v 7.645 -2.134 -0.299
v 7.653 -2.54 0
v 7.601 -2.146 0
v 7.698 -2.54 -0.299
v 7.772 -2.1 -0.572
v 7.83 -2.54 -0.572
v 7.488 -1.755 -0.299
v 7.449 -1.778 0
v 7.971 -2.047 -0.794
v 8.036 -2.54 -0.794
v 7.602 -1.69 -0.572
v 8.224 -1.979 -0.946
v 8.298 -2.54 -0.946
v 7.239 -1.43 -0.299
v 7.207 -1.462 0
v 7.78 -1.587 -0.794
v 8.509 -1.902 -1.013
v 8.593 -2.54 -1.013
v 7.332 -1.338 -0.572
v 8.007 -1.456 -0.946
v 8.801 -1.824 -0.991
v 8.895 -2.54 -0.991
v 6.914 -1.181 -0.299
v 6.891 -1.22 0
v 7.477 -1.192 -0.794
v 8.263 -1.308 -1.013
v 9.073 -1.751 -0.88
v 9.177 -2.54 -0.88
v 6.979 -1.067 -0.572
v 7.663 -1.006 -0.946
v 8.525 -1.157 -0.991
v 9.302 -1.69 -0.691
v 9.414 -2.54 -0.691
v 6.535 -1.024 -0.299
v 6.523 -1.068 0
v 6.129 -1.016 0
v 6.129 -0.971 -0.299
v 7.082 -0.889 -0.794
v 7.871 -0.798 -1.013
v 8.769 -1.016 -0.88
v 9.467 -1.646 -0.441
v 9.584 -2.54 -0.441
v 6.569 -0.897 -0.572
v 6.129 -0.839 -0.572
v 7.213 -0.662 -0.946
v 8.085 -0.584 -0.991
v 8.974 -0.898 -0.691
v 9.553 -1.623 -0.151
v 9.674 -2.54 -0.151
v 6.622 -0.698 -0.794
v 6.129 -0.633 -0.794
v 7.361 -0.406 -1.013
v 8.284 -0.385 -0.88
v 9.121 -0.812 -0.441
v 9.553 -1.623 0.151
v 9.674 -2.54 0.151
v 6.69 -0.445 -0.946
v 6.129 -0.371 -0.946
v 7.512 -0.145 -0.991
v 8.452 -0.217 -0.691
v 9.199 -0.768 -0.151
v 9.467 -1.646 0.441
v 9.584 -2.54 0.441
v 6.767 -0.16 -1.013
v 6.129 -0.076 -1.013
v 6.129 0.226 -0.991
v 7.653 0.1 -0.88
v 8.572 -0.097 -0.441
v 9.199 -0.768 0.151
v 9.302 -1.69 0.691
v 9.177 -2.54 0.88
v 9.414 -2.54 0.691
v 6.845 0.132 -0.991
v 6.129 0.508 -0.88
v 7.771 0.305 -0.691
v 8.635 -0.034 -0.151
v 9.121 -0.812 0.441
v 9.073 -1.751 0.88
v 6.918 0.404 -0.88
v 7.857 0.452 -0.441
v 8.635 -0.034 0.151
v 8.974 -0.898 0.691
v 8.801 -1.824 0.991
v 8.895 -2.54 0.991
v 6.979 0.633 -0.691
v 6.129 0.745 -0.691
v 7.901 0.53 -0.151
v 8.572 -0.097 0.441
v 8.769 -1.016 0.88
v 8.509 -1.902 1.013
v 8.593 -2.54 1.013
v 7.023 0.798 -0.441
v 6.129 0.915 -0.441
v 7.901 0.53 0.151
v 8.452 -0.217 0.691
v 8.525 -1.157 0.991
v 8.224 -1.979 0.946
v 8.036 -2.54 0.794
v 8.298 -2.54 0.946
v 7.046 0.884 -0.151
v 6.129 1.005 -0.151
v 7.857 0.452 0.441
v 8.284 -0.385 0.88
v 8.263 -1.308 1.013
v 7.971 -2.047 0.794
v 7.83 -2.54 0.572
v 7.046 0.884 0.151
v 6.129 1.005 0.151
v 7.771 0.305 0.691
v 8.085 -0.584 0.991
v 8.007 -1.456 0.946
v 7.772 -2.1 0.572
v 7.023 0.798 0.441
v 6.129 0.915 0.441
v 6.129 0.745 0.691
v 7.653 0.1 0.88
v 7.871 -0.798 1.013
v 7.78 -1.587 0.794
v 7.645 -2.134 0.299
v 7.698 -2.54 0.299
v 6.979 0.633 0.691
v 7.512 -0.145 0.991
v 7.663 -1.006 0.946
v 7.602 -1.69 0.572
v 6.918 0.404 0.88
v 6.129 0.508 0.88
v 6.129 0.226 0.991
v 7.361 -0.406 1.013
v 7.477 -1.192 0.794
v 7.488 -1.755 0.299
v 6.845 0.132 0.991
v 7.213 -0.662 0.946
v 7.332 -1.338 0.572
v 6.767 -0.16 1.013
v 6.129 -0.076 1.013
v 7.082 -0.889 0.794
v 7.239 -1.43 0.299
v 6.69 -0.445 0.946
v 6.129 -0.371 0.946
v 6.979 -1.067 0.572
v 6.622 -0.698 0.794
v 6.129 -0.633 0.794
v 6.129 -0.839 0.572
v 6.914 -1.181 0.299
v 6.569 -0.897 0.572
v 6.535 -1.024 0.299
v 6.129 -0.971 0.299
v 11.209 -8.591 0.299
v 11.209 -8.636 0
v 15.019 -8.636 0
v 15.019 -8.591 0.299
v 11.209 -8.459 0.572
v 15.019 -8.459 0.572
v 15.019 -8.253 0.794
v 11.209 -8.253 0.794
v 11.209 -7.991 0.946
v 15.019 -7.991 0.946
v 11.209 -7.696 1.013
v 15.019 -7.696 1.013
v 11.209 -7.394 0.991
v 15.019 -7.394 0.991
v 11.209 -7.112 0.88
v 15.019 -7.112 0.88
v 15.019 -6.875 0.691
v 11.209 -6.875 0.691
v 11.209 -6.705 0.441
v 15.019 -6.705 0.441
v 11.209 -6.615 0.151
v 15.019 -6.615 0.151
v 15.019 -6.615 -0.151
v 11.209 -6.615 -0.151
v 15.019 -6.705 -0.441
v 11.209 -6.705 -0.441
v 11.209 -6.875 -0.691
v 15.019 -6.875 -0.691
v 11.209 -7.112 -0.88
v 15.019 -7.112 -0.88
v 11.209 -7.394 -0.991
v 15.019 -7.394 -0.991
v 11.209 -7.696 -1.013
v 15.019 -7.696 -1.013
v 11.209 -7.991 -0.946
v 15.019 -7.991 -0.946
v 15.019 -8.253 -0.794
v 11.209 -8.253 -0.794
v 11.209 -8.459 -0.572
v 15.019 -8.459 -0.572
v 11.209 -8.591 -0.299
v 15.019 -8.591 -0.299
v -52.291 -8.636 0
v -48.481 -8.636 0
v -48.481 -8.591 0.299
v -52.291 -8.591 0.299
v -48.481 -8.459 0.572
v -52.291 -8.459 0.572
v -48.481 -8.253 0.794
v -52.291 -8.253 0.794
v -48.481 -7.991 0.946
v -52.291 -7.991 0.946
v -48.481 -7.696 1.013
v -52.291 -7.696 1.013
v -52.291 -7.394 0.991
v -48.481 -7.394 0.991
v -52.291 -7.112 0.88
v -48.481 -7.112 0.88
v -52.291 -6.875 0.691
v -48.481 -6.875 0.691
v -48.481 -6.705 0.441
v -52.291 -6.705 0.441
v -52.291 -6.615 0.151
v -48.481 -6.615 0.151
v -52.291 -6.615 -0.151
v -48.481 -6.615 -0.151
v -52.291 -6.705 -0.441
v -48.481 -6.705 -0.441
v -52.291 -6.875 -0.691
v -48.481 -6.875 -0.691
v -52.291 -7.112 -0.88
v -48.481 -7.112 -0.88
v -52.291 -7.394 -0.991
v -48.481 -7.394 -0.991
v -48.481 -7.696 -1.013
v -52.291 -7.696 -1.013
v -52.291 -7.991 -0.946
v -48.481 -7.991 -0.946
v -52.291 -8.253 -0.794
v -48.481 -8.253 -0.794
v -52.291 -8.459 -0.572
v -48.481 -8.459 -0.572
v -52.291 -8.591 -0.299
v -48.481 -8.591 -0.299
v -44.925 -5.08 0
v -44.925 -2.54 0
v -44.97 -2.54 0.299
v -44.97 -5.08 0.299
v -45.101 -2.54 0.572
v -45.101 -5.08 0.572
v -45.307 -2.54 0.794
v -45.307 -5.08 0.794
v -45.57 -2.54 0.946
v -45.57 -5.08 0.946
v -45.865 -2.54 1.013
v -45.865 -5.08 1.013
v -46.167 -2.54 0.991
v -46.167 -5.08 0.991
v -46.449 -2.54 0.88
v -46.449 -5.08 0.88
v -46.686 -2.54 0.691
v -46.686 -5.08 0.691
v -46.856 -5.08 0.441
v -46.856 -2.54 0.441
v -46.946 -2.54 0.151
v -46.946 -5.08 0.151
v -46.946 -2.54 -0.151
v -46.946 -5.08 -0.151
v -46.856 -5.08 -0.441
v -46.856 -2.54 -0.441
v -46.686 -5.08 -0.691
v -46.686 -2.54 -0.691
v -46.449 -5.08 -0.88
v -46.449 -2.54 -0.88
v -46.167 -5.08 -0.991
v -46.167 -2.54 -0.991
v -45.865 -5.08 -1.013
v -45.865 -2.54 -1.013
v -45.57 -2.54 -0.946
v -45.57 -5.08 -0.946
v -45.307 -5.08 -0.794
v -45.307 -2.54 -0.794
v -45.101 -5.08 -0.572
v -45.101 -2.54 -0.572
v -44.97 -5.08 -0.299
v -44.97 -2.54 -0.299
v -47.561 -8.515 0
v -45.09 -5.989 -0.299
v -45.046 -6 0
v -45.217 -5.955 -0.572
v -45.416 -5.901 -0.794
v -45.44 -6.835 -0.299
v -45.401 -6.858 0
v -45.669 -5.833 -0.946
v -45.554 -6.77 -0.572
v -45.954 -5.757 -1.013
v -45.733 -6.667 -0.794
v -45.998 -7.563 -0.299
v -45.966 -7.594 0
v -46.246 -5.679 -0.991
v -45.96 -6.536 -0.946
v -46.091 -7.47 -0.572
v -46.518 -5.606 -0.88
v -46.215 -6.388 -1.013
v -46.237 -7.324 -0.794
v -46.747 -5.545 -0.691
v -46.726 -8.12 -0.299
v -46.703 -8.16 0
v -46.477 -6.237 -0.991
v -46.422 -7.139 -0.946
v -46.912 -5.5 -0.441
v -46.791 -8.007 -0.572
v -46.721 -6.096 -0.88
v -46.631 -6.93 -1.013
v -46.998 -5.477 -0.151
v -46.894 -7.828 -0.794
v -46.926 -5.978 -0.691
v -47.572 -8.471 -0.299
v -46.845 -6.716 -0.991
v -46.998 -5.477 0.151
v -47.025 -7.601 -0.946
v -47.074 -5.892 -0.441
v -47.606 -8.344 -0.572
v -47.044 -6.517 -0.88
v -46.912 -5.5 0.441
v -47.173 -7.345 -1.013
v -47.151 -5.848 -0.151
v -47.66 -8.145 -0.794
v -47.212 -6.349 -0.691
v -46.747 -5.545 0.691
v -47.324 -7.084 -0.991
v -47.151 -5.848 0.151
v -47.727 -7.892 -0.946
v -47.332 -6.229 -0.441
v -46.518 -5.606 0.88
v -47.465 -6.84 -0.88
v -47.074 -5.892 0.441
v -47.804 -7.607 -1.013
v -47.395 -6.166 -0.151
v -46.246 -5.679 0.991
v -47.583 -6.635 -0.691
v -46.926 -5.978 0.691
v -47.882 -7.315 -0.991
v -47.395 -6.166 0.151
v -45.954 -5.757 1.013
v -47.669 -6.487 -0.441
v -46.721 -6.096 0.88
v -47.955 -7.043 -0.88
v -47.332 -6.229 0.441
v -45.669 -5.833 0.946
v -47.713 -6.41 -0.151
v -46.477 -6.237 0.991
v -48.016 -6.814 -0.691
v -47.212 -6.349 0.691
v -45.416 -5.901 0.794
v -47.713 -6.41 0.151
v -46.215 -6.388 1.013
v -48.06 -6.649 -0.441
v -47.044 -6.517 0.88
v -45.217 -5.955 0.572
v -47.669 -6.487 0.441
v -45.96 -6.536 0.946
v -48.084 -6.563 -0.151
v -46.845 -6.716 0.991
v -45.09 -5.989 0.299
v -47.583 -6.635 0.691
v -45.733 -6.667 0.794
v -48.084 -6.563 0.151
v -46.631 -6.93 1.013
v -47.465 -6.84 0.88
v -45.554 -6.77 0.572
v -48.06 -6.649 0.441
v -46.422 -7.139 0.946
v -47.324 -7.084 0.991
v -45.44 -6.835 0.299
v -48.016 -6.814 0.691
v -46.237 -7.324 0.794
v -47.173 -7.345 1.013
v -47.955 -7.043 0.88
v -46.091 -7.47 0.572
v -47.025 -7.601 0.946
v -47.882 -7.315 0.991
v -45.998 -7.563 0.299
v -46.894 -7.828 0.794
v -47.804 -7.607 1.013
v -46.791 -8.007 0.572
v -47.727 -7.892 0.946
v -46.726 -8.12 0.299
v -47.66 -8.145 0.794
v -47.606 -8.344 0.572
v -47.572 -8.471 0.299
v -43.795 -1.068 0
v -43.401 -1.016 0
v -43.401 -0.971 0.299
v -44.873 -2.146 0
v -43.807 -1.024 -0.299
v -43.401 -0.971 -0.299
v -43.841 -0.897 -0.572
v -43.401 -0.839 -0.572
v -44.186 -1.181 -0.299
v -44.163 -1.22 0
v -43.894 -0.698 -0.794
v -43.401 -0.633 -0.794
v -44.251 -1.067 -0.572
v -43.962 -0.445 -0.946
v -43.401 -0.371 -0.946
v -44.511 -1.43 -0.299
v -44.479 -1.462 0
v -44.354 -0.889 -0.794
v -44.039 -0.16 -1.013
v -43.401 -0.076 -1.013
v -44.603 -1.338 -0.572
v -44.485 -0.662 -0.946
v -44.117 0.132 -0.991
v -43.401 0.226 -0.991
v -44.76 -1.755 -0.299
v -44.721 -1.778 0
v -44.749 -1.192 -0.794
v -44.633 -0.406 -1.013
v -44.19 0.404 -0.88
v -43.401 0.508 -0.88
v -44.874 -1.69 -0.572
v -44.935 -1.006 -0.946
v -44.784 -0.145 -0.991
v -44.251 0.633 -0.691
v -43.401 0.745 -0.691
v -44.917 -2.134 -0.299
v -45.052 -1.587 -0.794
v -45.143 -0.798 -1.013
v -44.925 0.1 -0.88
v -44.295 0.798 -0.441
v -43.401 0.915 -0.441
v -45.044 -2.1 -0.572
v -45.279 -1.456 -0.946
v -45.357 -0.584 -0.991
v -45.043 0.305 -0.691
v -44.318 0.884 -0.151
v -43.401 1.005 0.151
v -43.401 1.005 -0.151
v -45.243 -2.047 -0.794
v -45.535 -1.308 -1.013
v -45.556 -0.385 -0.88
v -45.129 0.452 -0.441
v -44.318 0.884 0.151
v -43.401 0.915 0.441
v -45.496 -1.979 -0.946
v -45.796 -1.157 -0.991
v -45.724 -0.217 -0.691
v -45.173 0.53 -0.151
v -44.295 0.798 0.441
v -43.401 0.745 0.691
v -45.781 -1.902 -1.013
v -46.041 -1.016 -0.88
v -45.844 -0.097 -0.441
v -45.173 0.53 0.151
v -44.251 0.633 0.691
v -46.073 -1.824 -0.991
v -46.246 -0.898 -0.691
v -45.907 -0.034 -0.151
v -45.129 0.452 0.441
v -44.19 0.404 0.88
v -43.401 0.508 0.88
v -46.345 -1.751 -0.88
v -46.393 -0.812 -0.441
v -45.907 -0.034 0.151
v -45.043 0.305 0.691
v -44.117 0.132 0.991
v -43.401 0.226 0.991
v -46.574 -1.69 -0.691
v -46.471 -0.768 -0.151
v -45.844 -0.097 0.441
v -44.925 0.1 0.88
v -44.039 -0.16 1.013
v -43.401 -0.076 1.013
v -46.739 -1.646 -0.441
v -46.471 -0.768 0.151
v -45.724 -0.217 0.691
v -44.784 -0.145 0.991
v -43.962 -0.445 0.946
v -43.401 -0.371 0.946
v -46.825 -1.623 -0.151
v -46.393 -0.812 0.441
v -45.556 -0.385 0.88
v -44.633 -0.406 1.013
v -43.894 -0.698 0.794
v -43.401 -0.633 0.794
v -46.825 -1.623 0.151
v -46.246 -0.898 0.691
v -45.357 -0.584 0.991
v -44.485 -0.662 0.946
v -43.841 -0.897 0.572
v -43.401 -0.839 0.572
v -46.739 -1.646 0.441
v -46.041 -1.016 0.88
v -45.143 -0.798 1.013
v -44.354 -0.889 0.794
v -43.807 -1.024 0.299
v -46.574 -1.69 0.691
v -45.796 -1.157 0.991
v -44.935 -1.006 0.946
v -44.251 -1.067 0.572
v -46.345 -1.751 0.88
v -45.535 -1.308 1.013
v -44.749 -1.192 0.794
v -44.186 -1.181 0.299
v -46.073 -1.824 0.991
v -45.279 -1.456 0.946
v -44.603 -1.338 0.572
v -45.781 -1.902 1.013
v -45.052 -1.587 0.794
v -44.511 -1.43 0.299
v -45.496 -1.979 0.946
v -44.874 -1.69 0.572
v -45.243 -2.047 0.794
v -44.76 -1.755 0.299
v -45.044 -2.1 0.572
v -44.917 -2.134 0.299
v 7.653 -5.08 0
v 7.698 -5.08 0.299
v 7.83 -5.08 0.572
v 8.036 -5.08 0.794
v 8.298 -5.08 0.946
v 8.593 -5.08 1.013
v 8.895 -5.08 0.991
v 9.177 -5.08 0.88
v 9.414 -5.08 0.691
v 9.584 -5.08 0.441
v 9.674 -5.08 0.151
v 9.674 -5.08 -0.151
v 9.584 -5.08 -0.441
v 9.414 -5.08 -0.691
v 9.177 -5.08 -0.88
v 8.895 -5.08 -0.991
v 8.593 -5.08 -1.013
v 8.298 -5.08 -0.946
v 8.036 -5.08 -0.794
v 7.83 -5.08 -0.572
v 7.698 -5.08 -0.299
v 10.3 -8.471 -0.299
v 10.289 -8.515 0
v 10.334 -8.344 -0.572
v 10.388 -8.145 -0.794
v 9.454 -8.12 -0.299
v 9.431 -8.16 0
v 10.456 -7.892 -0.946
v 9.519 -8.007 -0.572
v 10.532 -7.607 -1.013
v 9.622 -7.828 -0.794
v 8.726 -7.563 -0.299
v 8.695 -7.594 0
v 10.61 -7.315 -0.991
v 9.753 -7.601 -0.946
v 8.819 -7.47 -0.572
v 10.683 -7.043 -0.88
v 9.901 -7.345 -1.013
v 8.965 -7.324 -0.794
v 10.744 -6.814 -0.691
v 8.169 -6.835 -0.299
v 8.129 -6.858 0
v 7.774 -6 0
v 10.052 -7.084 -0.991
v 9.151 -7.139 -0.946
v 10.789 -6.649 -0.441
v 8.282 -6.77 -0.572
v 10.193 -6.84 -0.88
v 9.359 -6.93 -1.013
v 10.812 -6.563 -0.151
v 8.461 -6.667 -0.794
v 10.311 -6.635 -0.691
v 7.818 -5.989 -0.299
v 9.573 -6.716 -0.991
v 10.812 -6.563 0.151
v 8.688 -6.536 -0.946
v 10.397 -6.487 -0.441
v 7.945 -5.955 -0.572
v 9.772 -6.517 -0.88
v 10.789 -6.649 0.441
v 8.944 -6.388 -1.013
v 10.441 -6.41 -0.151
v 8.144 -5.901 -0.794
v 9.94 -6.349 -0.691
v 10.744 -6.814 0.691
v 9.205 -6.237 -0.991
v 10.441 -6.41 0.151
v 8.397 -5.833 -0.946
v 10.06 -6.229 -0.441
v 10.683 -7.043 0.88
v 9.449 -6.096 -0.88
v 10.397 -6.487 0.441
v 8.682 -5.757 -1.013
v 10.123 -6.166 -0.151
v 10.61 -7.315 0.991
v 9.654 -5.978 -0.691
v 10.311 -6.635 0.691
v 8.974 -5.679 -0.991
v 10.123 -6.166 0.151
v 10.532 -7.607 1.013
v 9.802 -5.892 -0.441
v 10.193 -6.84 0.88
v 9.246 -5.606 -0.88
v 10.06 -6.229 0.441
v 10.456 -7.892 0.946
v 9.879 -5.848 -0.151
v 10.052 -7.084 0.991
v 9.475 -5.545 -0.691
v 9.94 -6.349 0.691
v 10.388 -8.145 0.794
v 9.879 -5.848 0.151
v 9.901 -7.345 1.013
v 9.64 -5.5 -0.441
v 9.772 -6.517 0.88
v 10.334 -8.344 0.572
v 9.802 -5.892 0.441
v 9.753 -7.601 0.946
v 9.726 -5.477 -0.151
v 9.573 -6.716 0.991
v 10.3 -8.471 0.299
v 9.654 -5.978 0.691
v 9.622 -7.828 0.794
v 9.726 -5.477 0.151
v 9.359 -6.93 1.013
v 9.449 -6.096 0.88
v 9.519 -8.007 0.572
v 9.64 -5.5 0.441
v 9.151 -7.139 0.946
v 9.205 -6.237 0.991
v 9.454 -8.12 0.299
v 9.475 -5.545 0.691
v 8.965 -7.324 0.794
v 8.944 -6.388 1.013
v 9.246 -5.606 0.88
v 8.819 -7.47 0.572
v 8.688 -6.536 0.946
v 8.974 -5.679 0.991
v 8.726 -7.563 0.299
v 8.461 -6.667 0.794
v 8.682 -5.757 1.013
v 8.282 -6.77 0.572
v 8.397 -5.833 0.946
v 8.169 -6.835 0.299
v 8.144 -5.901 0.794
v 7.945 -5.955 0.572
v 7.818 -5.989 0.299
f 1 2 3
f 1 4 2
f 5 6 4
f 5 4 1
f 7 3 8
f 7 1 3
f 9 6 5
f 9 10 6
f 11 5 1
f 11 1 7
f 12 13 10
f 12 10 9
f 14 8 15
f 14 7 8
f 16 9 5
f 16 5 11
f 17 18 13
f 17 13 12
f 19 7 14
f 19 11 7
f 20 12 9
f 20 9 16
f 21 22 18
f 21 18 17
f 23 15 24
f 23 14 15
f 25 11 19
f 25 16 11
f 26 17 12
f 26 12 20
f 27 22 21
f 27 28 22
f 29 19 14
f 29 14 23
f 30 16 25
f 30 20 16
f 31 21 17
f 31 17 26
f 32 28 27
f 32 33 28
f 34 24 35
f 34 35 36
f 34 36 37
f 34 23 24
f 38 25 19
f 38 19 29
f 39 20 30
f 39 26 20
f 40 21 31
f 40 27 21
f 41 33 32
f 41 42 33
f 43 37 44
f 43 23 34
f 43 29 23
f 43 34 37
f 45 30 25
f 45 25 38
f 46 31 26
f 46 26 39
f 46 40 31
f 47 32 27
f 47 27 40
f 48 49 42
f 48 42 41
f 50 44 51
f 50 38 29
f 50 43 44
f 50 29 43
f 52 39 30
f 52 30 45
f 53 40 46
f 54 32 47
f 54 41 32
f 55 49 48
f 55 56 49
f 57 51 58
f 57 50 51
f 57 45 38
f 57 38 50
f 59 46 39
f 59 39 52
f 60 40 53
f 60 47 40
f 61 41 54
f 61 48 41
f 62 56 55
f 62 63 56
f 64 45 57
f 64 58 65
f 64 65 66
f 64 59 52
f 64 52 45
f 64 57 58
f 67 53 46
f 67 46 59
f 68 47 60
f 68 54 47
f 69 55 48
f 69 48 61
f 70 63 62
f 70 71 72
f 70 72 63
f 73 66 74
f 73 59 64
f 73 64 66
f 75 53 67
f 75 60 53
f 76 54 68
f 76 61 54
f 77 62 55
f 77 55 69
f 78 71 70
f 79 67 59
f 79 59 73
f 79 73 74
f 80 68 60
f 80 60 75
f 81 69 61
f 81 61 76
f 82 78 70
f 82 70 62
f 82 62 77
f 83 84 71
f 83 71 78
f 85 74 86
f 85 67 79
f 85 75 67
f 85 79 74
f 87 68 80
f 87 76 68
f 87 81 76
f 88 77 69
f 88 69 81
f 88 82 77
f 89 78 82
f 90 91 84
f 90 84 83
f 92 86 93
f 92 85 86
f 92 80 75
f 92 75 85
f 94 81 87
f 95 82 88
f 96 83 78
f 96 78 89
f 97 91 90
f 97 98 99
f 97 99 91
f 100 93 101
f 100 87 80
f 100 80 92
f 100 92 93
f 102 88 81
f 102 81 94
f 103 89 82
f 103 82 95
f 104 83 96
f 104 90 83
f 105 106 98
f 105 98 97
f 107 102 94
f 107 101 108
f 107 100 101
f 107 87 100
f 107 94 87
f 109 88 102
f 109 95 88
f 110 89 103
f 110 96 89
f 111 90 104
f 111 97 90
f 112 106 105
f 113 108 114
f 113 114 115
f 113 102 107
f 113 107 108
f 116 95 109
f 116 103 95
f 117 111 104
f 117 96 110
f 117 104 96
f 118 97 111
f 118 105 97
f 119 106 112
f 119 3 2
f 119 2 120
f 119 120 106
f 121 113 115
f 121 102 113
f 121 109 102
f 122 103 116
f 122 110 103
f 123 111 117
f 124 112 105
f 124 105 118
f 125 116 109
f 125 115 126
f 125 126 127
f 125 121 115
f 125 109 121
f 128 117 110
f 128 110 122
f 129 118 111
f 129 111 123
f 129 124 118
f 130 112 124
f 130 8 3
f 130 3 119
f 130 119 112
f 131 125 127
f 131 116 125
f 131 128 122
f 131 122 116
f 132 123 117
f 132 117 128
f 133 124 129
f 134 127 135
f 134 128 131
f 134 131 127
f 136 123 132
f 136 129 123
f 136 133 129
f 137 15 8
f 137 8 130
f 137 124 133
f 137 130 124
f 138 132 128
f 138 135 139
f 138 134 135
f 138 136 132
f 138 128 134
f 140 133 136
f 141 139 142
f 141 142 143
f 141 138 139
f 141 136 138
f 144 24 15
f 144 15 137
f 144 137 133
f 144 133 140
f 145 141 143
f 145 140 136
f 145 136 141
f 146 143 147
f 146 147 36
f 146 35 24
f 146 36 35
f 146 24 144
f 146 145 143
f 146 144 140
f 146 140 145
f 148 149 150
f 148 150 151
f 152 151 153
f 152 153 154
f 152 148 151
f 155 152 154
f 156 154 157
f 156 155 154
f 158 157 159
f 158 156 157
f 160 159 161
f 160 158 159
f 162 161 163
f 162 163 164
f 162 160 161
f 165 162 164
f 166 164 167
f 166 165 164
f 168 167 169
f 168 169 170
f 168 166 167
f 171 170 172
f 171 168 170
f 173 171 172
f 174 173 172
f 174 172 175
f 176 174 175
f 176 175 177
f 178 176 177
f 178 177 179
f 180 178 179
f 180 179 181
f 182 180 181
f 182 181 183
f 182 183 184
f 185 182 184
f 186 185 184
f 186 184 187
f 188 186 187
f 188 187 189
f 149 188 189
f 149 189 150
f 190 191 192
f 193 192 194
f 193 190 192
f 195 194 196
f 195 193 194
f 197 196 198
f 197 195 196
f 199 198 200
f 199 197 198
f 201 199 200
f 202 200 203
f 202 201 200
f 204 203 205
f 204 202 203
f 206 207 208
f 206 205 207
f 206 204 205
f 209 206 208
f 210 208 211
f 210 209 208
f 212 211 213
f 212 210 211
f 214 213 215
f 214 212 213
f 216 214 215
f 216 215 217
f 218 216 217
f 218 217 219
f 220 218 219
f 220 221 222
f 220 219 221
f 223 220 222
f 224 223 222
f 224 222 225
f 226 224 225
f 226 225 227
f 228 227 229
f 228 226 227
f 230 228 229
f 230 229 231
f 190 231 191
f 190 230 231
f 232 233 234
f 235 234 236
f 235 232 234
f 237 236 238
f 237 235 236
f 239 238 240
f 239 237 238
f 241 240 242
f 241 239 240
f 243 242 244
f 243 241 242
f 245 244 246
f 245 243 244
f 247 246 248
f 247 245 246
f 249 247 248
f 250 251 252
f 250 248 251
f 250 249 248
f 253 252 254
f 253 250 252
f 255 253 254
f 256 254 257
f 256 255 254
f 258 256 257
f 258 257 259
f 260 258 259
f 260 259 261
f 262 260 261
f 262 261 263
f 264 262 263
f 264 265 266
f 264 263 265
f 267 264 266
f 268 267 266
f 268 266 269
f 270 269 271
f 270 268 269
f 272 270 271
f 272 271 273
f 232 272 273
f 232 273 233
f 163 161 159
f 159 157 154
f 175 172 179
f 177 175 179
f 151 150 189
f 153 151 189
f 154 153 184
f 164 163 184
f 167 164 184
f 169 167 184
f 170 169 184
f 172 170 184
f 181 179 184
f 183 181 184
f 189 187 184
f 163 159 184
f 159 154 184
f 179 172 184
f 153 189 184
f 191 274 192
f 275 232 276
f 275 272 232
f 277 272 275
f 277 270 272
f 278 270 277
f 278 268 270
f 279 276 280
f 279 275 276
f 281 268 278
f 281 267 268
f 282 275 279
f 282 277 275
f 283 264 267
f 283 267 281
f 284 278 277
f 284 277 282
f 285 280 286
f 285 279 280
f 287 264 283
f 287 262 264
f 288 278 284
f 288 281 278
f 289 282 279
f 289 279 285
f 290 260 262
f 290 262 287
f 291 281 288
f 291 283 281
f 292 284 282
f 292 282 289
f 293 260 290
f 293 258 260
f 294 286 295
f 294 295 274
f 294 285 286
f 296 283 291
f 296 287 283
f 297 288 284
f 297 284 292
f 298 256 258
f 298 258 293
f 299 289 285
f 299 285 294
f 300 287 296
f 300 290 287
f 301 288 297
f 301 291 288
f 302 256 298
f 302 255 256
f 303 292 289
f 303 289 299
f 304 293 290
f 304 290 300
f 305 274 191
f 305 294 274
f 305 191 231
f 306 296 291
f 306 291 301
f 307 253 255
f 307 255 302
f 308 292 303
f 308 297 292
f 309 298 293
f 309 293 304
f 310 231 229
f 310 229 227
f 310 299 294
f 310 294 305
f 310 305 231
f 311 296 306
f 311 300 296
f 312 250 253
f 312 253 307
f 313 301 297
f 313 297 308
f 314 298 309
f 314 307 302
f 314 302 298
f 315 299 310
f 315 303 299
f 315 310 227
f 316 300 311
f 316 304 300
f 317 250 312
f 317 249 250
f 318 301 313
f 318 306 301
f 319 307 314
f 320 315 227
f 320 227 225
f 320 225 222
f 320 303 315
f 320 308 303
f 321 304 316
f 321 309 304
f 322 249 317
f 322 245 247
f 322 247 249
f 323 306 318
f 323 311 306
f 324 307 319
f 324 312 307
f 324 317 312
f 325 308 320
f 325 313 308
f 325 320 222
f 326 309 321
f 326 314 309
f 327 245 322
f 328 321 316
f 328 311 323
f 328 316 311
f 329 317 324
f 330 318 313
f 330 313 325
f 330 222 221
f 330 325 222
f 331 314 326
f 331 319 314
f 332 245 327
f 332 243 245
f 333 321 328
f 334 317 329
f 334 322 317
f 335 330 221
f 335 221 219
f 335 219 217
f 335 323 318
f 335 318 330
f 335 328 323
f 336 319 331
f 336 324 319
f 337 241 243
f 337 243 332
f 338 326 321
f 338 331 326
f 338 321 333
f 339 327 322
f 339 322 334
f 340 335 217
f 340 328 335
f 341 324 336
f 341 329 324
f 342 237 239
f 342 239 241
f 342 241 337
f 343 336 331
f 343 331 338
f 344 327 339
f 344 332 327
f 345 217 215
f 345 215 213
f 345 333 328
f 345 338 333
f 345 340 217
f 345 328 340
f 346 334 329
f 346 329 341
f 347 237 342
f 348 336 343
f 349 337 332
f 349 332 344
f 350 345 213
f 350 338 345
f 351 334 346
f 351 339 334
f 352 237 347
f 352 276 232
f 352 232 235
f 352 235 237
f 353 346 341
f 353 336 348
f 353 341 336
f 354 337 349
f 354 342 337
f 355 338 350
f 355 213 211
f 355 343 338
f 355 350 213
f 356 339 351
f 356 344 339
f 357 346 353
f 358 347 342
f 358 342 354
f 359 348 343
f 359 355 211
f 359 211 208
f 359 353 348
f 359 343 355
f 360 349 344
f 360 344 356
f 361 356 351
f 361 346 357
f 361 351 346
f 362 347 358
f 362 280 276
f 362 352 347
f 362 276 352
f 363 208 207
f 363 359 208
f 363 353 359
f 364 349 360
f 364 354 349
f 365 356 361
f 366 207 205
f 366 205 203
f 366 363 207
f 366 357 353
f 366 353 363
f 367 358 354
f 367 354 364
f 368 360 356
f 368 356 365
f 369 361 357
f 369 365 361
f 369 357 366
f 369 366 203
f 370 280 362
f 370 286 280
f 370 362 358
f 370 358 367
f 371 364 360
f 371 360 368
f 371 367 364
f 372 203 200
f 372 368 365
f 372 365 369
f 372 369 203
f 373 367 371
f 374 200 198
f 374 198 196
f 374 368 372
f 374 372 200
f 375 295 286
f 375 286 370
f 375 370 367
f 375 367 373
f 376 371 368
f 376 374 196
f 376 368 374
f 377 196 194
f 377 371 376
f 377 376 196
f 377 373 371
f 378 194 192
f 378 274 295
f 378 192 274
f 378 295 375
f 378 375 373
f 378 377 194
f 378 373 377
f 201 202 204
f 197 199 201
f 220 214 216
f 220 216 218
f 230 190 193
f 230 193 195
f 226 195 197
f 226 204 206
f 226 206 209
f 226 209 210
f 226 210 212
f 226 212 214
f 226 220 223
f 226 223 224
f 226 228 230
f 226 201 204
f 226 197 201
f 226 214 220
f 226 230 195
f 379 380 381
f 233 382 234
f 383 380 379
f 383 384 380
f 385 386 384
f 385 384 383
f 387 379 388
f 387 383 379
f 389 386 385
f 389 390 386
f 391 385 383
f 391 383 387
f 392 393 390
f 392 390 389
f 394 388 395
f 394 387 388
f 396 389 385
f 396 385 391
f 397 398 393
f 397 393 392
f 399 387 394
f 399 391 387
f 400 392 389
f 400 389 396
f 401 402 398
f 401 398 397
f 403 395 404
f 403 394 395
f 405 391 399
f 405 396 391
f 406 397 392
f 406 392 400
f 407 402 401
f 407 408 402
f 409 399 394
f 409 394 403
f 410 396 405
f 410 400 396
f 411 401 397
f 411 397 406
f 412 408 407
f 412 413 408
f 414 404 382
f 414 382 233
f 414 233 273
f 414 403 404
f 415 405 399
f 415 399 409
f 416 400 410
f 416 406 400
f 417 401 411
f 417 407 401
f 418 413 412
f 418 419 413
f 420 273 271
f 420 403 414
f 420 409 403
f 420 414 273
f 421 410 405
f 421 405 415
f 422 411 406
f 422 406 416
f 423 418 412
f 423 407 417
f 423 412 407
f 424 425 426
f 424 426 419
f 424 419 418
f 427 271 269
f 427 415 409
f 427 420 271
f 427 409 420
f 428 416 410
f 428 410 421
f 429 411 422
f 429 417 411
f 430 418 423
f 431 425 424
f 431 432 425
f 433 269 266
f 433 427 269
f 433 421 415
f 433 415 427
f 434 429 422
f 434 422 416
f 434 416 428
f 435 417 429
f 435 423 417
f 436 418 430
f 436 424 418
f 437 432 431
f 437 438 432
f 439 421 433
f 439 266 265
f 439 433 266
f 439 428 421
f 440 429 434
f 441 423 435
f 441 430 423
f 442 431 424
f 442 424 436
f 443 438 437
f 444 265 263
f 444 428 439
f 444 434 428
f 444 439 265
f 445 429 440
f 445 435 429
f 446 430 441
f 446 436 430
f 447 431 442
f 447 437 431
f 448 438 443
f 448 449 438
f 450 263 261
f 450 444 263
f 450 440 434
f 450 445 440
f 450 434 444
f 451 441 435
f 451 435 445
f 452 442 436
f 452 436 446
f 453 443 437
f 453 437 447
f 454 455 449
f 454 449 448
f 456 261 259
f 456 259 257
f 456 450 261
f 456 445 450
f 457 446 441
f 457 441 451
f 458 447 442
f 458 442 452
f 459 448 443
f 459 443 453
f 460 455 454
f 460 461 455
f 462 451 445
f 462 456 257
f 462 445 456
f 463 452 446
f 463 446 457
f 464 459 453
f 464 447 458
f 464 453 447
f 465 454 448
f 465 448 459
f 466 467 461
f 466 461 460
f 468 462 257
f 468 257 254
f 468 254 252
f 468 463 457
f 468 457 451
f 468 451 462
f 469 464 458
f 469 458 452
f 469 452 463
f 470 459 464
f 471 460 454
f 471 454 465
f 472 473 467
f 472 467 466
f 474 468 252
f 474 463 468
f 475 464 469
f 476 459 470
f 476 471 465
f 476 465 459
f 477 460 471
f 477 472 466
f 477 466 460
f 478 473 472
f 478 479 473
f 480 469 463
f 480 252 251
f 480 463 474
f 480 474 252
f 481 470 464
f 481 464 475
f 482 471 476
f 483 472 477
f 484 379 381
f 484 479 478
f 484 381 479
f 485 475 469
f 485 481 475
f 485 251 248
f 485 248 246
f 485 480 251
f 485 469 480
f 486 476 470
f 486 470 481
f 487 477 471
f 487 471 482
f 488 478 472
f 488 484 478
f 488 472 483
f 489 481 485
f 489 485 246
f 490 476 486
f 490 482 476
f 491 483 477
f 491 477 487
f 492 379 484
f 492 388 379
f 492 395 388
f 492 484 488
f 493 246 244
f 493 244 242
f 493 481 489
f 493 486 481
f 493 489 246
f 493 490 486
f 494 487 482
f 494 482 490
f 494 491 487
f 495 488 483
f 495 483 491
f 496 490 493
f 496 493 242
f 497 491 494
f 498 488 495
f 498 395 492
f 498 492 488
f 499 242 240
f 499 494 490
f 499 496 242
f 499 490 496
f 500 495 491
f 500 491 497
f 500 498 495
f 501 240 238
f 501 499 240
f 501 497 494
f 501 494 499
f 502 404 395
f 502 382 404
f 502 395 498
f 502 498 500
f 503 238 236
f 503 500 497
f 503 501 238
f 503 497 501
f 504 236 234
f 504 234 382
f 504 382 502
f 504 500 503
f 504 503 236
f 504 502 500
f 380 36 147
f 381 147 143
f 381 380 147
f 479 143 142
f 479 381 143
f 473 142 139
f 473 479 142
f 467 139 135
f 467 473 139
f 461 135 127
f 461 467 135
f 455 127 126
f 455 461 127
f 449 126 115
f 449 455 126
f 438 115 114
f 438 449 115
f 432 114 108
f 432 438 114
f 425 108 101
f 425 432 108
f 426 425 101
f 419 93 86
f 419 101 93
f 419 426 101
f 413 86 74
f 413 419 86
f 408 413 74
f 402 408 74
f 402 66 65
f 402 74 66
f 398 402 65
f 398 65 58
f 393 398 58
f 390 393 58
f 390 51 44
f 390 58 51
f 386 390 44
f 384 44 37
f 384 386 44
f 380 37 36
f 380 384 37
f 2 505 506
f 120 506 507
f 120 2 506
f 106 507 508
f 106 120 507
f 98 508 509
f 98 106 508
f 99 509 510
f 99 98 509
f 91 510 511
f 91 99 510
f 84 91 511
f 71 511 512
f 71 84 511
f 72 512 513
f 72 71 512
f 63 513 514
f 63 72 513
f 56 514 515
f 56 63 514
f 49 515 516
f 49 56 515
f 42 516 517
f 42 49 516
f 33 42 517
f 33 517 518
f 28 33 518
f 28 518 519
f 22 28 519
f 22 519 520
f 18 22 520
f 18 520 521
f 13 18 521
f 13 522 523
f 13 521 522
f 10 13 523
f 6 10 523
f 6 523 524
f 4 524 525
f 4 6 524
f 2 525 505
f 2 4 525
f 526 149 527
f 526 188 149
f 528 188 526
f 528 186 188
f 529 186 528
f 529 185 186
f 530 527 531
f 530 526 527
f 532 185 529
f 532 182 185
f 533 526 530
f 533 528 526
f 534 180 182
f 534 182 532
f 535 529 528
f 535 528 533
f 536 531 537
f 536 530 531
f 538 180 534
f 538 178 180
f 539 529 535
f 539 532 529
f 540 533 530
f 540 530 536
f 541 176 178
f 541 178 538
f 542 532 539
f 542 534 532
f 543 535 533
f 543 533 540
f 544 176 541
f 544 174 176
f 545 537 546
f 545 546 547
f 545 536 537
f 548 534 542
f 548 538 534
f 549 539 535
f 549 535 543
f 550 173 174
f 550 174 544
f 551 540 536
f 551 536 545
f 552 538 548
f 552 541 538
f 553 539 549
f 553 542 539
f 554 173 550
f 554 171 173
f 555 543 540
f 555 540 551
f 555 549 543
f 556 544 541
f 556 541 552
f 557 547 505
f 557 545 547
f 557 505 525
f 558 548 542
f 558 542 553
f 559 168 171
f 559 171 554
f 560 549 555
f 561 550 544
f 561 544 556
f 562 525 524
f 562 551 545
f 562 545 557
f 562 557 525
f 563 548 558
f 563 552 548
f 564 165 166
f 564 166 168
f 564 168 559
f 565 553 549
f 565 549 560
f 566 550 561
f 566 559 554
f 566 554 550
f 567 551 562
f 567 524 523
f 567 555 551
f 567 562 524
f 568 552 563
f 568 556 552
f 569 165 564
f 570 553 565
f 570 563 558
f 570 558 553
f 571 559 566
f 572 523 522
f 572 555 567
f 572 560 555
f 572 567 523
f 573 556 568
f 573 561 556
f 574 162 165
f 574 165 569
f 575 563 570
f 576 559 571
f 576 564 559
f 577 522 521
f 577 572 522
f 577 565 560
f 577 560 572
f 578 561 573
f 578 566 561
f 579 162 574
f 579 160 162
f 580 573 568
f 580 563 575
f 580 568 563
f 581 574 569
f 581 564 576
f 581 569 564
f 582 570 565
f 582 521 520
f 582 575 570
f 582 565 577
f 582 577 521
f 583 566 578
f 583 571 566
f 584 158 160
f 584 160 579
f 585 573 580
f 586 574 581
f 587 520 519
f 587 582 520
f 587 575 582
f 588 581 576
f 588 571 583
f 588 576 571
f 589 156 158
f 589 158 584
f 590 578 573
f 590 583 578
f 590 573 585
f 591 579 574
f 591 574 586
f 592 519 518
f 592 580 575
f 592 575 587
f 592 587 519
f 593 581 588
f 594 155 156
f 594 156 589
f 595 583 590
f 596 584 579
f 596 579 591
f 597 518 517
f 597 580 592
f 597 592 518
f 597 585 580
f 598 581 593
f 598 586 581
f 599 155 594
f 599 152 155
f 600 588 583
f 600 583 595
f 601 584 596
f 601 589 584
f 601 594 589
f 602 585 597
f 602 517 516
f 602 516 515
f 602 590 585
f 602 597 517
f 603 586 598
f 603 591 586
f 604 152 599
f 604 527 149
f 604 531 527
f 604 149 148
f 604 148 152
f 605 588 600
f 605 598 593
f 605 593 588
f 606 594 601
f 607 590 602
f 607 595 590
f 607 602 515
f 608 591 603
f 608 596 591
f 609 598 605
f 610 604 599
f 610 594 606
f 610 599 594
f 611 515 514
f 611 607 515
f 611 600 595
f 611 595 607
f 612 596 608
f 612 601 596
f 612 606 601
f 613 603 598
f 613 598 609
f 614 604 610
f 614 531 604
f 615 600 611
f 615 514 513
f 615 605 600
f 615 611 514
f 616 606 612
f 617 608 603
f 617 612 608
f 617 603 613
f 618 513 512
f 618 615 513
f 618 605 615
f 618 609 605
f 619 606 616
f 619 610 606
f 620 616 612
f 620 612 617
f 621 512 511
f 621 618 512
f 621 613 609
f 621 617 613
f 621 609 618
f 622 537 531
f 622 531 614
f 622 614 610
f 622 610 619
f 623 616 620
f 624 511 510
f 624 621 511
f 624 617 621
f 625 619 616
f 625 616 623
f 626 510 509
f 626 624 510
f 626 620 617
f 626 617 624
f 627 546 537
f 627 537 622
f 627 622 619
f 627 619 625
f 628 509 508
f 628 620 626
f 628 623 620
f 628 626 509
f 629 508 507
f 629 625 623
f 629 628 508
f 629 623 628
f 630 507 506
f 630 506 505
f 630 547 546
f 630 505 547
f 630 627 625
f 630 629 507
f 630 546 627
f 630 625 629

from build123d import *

# Parameters (mm, degrees)
SWEEP2_PROFILE_R = 1.016


with BuildPart() as part:
    # Sweep2: sweep along a path in Sketch12
    with BuildLine(Plane.XY) as sweep2_path:
        Line((15.019045905, -7.62), (11.209045905, -7.62))
        ThreePointArc((11.209045905, -7.62), (9.412994681, -6.876051224), (8.669045905, -5.08))
        Line((8.669045905, -5.08), (8.669045905, -2.54))
        ThreePointArc((8.669045905, -2.54), (7.925097129, -0.743948776), (6.129045905, 0))
        Line((6.129045905, 0), (-38.320954095, 0))
        Line((-38.320954095, 0), (-43.400954095, 0))
        ThreePointArc((-43.400954095, 0), (-45.197005319, -0.743948776), (-45.940954095, -2.54))
        Line((-45.940954095, -2.54), (-45.940954095, -5.08))
        ThreePointArc((-45.940954095, -5.08), (-46.684902871, -6.876051224), (-48.480954095, -7.62))
        Line((-48.480954095, -7.62), (-52.290954095, -7.62))
    # Sweep2 profile (on start of the path) → Sweep2 (sweep)
    with BuildSketch(Plane(origin=(15.019045905, -7.62, 0), x_dir=(0, -1, 0), z_dir=(-1, 0, 0))):
        Circle(SWEEP2_PROFILE_R)
    sweep(path=sweep2_path.line)


solid = part.part
